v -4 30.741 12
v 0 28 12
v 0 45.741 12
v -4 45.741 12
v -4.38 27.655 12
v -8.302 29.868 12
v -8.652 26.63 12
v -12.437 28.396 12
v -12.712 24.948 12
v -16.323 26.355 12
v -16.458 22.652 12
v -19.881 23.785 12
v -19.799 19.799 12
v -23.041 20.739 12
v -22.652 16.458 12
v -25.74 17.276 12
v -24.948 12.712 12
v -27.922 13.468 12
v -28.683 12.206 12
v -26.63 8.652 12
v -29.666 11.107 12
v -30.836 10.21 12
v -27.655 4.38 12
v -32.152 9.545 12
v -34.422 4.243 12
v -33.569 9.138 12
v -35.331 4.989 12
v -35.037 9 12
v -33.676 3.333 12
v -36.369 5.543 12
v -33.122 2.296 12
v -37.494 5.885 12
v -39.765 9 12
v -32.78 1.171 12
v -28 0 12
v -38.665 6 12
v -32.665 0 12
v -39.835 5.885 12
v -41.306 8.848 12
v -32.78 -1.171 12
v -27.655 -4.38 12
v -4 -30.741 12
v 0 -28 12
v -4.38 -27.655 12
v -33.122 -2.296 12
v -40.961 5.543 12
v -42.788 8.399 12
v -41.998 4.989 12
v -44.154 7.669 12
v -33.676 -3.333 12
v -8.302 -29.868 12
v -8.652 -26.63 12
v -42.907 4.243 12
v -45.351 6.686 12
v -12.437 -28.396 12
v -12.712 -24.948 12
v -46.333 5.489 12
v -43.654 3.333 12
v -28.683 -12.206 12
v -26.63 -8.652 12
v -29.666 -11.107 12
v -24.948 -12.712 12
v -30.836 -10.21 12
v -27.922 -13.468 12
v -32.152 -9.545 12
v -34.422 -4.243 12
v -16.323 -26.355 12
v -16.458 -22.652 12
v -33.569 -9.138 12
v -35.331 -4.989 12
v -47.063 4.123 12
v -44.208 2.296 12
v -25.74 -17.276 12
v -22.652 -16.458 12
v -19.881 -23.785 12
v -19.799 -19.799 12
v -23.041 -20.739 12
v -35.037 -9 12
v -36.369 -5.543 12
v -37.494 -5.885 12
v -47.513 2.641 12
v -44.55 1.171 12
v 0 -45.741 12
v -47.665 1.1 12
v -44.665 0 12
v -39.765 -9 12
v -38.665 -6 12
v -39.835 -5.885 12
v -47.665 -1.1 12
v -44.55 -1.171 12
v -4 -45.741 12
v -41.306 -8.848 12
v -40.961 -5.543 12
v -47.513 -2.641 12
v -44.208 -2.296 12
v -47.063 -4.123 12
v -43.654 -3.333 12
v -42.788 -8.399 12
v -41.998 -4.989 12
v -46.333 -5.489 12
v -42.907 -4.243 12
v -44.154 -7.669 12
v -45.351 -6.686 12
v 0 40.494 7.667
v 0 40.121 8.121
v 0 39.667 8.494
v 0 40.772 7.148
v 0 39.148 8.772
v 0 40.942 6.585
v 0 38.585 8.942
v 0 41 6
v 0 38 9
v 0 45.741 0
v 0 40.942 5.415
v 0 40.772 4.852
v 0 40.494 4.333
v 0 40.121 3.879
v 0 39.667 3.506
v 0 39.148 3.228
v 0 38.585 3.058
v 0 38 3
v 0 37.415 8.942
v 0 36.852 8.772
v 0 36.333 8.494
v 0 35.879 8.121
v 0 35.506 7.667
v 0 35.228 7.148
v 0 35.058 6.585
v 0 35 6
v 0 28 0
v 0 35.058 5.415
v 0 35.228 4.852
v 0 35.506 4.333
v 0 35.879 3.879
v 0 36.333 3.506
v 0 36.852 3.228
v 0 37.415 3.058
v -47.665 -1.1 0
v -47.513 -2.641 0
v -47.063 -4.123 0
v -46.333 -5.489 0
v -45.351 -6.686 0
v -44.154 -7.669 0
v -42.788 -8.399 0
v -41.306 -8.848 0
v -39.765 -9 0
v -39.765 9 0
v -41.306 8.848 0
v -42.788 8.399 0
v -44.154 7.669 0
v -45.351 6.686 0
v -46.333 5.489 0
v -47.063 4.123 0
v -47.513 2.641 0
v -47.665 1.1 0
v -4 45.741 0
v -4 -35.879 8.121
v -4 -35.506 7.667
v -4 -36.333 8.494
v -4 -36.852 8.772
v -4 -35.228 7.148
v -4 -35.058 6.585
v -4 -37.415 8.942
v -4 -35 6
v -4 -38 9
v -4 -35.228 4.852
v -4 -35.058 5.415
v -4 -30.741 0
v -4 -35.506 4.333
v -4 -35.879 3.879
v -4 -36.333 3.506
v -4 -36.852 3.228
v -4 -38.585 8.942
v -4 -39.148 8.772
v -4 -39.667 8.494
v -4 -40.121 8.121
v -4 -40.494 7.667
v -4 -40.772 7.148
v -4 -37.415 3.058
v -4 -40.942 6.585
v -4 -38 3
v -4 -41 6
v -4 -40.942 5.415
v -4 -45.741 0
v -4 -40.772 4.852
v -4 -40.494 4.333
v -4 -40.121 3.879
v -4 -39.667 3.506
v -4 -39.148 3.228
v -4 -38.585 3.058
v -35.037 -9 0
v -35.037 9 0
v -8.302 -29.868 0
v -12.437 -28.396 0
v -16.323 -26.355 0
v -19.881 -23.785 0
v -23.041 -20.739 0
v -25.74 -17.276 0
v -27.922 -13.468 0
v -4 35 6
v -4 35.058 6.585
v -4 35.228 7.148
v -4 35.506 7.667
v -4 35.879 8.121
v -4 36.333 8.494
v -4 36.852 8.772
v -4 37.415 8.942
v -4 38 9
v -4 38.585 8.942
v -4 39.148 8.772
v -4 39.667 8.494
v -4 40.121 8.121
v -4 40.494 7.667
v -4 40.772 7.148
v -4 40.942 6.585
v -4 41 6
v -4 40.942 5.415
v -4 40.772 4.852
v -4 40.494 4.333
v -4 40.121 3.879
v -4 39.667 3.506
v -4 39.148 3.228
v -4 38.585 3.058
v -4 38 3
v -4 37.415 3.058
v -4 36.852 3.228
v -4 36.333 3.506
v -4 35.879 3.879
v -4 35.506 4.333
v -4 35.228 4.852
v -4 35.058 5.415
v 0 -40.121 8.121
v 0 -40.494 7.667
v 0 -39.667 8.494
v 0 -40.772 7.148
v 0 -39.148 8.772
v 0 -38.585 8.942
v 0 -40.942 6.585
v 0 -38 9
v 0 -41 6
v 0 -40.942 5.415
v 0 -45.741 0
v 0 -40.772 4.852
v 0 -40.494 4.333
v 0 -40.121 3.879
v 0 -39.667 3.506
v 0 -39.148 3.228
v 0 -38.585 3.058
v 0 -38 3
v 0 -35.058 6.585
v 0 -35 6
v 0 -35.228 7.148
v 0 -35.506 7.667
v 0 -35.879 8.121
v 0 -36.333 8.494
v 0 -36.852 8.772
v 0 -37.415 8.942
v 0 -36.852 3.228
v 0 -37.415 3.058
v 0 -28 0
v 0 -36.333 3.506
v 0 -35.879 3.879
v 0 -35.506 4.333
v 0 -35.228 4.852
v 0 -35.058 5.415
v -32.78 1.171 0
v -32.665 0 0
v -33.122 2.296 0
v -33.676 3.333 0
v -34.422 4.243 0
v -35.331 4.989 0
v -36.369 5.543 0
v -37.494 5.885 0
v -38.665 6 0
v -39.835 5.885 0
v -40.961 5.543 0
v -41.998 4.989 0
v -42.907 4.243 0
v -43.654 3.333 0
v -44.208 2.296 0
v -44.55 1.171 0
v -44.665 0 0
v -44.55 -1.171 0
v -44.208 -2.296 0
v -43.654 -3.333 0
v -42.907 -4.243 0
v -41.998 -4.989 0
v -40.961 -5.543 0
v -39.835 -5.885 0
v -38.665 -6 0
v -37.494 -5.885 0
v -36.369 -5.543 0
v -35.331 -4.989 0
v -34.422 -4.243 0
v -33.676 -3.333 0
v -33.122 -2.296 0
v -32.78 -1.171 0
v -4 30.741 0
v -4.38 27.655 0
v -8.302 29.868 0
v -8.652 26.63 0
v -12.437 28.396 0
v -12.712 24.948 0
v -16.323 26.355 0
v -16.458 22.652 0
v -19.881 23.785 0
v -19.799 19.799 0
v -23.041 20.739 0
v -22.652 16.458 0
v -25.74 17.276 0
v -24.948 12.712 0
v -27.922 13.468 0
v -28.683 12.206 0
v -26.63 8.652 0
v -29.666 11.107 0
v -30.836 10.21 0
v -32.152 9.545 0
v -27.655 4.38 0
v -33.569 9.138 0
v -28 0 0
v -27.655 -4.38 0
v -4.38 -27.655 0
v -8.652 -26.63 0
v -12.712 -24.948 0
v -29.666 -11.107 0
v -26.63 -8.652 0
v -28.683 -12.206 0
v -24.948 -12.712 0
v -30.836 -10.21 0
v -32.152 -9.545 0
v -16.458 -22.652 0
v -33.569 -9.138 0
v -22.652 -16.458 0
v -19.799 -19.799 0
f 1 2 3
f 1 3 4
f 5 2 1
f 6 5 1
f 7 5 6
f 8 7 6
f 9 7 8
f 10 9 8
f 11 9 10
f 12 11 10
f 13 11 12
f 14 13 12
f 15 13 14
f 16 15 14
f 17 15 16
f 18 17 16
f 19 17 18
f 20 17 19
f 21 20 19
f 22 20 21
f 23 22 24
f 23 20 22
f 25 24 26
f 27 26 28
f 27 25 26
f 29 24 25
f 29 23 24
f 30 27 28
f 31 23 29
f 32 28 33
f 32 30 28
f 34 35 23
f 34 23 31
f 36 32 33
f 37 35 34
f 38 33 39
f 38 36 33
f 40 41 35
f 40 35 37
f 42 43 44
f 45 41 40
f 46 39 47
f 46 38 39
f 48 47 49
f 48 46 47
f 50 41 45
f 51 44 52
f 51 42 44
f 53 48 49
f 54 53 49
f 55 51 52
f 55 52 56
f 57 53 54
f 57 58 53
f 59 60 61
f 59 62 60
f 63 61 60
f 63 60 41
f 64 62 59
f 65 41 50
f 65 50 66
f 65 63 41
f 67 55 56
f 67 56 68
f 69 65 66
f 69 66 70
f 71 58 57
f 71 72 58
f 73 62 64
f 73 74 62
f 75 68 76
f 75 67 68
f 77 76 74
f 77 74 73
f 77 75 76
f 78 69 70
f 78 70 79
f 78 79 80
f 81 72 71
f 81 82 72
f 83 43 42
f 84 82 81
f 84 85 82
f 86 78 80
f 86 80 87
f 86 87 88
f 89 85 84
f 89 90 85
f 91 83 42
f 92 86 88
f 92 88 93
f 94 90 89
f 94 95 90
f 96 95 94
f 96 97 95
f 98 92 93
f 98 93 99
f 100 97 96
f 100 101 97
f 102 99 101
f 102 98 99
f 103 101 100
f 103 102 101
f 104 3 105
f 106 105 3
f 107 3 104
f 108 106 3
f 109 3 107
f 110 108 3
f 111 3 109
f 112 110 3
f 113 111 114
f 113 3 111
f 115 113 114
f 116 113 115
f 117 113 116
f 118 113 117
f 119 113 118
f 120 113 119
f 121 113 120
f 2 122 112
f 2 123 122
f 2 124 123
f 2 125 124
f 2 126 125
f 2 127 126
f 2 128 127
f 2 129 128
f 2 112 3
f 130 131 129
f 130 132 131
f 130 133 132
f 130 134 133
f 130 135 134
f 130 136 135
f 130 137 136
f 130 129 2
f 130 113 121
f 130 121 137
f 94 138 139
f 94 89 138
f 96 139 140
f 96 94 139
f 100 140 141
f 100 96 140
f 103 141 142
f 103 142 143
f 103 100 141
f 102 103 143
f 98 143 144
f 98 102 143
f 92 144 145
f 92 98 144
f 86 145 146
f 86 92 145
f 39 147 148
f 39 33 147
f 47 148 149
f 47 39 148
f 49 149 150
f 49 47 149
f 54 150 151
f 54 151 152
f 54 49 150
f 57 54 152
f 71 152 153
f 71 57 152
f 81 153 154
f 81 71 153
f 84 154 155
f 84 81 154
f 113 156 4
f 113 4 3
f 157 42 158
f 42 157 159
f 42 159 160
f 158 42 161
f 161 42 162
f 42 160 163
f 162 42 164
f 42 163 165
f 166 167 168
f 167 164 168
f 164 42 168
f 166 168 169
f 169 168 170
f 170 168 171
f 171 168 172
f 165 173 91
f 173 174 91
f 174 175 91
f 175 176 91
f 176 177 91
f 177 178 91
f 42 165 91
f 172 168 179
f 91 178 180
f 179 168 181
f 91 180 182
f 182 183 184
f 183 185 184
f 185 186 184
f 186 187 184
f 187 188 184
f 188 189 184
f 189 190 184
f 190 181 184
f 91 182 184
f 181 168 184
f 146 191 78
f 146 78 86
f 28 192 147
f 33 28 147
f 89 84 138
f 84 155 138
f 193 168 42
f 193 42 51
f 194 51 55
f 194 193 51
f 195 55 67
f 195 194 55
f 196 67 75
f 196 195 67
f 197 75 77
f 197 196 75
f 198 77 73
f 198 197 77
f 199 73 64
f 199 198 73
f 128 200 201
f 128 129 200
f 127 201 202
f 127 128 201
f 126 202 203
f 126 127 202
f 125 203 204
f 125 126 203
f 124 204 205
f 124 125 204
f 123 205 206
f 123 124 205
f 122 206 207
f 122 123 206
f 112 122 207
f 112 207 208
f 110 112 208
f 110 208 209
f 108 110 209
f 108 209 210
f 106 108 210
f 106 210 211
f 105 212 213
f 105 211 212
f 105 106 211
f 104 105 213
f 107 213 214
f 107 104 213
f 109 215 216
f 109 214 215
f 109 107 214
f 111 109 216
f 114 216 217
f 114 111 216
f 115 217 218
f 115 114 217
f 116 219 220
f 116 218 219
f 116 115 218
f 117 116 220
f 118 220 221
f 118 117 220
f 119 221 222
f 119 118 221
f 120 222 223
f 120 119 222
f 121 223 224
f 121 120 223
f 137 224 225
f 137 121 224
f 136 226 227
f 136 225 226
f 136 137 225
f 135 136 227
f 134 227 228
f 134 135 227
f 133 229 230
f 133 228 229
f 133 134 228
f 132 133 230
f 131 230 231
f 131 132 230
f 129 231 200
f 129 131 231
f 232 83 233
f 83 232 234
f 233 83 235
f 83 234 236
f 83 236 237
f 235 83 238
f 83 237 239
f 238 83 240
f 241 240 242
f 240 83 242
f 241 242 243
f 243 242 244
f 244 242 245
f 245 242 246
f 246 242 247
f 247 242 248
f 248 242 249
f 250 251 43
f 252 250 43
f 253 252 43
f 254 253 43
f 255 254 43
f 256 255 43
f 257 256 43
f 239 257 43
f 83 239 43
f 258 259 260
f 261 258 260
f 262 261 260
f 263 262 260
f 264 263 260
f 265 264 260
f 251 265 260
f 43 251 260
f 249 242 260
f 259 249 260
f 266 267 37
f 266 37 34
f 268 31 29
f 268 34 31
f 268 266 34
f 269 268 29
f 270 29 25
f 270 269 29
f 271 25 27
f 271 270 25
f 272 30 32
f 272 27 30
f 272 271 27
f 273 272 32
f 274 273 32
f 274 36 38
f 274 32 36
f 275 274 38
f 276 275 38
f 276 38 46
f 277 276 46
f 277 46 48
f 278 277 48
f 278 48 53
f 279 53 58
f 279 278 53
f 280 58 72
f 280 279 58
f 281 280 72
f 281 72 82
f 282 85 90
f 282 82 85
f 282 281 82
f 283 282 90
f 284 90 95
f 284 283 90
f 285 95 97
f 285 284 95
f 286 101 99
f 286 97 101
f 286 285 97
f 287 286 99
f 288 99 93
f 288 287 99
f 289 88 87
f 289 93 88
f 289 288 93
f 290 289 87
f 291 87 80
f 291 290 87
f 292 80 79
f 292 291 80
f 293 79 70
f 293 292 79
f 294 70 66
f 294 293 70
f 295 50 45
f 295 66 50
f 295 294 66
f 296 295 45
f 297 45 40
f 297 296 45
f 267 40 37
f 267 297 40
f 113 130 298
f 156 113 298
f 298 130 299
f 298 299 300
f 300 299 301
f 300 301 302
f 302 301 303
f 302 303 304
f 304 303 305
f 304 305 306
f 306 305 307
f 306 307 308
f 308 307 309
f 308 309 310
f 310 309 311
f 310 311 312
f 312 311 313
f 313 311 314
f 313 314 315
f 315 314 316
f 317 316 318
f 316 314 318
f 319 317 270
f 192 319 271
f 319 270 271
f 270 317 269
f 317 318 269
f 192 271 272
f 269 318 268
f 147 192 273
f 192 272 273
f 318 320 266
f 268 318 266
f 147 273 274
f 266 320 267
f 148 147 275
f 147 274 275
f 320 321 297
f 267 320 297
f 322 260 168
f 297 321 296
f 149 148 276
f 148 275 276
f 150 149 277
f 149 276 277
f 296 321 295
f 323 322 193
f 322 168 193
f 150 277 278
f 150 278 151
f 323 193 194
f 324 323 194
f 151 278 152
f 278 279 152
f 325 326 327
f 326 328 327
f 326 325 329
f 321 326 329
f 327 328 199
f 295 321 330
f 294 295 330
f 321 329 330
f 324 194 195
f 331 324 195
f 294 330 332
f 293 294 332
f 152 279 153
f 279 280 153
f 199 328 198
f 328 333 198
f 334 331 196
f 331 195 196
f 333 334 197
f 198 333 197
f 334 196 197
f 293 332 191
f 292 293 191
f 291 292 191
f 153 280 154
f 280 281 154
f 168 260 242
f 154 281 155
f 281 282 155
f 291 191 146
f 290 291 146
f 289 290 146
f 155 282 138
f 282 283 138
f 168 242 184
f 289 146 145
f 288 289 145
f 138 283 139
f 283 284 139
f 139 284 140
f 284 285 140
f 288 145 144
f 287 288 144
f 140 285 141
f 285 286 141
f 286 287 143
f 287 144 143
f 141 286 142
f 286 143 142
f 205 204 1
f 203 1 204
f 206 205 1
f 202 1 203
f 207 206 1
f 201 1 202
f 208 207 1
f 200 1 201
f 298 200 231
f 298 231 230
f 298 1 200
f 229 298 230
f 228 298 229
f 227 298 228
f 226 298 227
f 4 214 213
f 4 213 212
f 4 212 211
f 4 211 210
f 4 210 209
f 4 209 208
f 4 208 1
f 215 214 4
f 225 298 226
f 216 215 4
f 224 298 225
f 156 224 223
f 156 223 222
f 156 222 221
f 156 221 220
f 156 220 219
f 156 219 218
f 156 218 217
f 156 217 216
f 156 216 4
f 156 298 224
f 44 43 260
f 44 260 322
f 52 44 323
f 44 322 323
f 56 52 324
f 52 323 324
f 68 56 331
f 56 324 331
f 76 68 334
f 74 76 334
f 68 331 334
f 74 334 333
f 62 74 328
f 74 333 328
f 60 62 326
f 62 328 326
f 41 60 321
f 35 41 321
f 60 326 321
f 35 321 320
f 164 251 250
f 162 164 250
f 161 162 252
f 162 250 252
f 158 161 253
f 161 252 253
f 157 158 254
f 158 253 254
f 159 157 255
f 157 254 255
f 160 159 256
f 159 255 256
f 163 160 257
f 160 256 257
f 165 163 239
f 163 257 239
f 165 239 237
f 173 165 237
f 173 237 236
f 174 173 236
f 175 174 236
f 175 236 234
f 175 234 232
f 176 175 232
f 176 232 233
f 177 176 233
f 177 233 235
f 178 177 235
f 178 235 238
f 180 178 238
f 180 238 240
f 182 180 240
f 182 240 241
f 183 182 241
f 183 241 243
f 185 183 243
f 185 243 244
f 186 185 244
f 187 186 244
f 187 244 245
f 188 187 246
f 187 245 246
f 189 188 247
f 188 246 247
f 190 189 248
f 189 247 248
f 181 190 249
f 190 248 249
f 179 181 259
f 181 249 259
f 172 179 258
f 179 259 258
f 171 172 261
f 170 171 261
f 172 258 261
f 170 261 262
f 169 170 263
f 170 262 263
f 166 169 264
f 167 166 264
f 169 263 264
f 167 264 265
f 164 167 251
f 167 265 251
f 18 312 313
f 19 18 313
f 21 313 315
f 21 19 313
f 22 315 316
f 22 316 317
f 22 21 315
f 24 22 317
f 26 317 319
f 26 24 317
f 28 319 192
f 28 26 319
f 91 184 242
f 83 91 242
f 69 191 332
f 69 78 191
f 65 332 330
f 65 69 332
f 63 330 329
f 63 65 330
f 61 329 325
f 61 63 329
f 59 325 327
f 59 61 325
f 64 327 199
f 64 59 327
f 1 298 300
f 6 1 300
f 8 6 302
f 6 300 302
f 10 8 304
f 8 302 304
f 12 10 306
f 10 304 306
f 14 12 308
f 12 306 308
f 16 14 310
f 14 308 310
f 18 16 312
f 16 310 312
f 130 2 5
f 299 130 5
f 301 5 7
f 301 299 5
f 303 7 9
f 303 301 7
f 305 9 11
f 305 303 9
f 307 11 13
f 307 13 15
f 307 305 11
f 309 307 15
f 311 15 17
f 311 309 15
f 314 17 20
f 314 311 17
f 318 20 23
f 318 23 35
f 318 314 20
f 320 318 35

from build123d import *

# Parameters (mm, degrees)
PAD_DEPTH         = 12
PAD001_DEPTH      = 12
SKETCH001_R       = 3
POCKET_DEPTH      = 255.365913
POCKET_DEPTH_BACK = 207.701119
FILLET_R          = 7.9


with BuildPart() as part:
    # Sketch → Pad (new body)
    with BuildSketch(Plane.XY):
        with BuildLine():
            ThreePointArc((0, 28), (-19.79899, 19.79899), (-28, 0))
            Line((-32.664794, 0), (-28, 0))
            ThreePointArc((-32.664794, 0), (-38.664794, 6), (-44.664794, 0))
            Line((-47.664794, 0), (-44.664794, 0))
            Line((-47.664794, 9), (-47.664794, 0))
            Line((-29.664794, 9), (-47.664794, 9))
            ThreePointArc((-4, 30.740852), (-20.037359, 23.653842), (-29.664794, 9))
            Line((-4, 30.740852), (-4, 45.740852))
            Line((-4, 45.740852), (0, 45.740852))
            Line((0, 45.740852), (0, 28))
        make_face()
    extrude(amount=PAD_DEPTH)

    # Sketch → Pad001 (join)
    with BuildSketch(Plane.XY):
        with BuildLine():
            ThreePointArc((0, 28), (-19.79899, 19.79899), (-28, 0))
            Line((-32.664794, 0), (-28, 0))
            ThreePointArc((-32.664794, 0), (-38.664794, 6), (-44.664794, 0))
            Line((-47.664794, 0), (-44.664794, 0))
            Line((-47.664794, 9), (-47.664794, 0))
            Line((-29.664794, 9), (-47.664794, 9))
            ThreePointArc((-4, 30.740852), (-20.037359, 23.653842), (-29.664794, 9))
            Line((-4, 30.740852), (-4, 45.740852))
            Line((-4, 45.740852), (0, 45.740852))
            Line((0, 45.740852), (0, 28))
        make_face()
    pad001 = extrude(amount=PAD001_DEPTH)

    # Mirrored001: Pad001 across Sketch H_Axis
    add(pad001.mirror(Plane.ZX))

    # Sketch001 → Pocket (cut, two sides)
    with BuildSketch(Plane.YZ) as pocket_sk:
        with Locations((-38, 6)):
            Circle(SKETCH001_R)
    pocket = extrude(amount=-POCKET_DEPTH, mode=Mode.SUBTRACT) + extrude(pocket_sk.sketch, amount=POCKET_DEPTH_BACK, mode=Mode.SUBTRACT)

    # Mirrored: Pocket across Sketch001 V_Axis
    add(pocket.mirror(Plane(origin=(0, 0, 0), x_dir=(1, 0, 0), z_dir=(0, 1, 0))), mode=Mode.SUBTRACT)

    # Fillet
    fillet_edges = [part.edges().sort_by_distance(p)[0] for p in [
        (-47.664794, 9, 6),
        (-47.664794, -9, 6),
        (-29.664794, -9, 6),
        (-29.664794, 9, 6),
    ]]
    fillet(fillet_edges, radius=FILLET_R)


solid = part.part
